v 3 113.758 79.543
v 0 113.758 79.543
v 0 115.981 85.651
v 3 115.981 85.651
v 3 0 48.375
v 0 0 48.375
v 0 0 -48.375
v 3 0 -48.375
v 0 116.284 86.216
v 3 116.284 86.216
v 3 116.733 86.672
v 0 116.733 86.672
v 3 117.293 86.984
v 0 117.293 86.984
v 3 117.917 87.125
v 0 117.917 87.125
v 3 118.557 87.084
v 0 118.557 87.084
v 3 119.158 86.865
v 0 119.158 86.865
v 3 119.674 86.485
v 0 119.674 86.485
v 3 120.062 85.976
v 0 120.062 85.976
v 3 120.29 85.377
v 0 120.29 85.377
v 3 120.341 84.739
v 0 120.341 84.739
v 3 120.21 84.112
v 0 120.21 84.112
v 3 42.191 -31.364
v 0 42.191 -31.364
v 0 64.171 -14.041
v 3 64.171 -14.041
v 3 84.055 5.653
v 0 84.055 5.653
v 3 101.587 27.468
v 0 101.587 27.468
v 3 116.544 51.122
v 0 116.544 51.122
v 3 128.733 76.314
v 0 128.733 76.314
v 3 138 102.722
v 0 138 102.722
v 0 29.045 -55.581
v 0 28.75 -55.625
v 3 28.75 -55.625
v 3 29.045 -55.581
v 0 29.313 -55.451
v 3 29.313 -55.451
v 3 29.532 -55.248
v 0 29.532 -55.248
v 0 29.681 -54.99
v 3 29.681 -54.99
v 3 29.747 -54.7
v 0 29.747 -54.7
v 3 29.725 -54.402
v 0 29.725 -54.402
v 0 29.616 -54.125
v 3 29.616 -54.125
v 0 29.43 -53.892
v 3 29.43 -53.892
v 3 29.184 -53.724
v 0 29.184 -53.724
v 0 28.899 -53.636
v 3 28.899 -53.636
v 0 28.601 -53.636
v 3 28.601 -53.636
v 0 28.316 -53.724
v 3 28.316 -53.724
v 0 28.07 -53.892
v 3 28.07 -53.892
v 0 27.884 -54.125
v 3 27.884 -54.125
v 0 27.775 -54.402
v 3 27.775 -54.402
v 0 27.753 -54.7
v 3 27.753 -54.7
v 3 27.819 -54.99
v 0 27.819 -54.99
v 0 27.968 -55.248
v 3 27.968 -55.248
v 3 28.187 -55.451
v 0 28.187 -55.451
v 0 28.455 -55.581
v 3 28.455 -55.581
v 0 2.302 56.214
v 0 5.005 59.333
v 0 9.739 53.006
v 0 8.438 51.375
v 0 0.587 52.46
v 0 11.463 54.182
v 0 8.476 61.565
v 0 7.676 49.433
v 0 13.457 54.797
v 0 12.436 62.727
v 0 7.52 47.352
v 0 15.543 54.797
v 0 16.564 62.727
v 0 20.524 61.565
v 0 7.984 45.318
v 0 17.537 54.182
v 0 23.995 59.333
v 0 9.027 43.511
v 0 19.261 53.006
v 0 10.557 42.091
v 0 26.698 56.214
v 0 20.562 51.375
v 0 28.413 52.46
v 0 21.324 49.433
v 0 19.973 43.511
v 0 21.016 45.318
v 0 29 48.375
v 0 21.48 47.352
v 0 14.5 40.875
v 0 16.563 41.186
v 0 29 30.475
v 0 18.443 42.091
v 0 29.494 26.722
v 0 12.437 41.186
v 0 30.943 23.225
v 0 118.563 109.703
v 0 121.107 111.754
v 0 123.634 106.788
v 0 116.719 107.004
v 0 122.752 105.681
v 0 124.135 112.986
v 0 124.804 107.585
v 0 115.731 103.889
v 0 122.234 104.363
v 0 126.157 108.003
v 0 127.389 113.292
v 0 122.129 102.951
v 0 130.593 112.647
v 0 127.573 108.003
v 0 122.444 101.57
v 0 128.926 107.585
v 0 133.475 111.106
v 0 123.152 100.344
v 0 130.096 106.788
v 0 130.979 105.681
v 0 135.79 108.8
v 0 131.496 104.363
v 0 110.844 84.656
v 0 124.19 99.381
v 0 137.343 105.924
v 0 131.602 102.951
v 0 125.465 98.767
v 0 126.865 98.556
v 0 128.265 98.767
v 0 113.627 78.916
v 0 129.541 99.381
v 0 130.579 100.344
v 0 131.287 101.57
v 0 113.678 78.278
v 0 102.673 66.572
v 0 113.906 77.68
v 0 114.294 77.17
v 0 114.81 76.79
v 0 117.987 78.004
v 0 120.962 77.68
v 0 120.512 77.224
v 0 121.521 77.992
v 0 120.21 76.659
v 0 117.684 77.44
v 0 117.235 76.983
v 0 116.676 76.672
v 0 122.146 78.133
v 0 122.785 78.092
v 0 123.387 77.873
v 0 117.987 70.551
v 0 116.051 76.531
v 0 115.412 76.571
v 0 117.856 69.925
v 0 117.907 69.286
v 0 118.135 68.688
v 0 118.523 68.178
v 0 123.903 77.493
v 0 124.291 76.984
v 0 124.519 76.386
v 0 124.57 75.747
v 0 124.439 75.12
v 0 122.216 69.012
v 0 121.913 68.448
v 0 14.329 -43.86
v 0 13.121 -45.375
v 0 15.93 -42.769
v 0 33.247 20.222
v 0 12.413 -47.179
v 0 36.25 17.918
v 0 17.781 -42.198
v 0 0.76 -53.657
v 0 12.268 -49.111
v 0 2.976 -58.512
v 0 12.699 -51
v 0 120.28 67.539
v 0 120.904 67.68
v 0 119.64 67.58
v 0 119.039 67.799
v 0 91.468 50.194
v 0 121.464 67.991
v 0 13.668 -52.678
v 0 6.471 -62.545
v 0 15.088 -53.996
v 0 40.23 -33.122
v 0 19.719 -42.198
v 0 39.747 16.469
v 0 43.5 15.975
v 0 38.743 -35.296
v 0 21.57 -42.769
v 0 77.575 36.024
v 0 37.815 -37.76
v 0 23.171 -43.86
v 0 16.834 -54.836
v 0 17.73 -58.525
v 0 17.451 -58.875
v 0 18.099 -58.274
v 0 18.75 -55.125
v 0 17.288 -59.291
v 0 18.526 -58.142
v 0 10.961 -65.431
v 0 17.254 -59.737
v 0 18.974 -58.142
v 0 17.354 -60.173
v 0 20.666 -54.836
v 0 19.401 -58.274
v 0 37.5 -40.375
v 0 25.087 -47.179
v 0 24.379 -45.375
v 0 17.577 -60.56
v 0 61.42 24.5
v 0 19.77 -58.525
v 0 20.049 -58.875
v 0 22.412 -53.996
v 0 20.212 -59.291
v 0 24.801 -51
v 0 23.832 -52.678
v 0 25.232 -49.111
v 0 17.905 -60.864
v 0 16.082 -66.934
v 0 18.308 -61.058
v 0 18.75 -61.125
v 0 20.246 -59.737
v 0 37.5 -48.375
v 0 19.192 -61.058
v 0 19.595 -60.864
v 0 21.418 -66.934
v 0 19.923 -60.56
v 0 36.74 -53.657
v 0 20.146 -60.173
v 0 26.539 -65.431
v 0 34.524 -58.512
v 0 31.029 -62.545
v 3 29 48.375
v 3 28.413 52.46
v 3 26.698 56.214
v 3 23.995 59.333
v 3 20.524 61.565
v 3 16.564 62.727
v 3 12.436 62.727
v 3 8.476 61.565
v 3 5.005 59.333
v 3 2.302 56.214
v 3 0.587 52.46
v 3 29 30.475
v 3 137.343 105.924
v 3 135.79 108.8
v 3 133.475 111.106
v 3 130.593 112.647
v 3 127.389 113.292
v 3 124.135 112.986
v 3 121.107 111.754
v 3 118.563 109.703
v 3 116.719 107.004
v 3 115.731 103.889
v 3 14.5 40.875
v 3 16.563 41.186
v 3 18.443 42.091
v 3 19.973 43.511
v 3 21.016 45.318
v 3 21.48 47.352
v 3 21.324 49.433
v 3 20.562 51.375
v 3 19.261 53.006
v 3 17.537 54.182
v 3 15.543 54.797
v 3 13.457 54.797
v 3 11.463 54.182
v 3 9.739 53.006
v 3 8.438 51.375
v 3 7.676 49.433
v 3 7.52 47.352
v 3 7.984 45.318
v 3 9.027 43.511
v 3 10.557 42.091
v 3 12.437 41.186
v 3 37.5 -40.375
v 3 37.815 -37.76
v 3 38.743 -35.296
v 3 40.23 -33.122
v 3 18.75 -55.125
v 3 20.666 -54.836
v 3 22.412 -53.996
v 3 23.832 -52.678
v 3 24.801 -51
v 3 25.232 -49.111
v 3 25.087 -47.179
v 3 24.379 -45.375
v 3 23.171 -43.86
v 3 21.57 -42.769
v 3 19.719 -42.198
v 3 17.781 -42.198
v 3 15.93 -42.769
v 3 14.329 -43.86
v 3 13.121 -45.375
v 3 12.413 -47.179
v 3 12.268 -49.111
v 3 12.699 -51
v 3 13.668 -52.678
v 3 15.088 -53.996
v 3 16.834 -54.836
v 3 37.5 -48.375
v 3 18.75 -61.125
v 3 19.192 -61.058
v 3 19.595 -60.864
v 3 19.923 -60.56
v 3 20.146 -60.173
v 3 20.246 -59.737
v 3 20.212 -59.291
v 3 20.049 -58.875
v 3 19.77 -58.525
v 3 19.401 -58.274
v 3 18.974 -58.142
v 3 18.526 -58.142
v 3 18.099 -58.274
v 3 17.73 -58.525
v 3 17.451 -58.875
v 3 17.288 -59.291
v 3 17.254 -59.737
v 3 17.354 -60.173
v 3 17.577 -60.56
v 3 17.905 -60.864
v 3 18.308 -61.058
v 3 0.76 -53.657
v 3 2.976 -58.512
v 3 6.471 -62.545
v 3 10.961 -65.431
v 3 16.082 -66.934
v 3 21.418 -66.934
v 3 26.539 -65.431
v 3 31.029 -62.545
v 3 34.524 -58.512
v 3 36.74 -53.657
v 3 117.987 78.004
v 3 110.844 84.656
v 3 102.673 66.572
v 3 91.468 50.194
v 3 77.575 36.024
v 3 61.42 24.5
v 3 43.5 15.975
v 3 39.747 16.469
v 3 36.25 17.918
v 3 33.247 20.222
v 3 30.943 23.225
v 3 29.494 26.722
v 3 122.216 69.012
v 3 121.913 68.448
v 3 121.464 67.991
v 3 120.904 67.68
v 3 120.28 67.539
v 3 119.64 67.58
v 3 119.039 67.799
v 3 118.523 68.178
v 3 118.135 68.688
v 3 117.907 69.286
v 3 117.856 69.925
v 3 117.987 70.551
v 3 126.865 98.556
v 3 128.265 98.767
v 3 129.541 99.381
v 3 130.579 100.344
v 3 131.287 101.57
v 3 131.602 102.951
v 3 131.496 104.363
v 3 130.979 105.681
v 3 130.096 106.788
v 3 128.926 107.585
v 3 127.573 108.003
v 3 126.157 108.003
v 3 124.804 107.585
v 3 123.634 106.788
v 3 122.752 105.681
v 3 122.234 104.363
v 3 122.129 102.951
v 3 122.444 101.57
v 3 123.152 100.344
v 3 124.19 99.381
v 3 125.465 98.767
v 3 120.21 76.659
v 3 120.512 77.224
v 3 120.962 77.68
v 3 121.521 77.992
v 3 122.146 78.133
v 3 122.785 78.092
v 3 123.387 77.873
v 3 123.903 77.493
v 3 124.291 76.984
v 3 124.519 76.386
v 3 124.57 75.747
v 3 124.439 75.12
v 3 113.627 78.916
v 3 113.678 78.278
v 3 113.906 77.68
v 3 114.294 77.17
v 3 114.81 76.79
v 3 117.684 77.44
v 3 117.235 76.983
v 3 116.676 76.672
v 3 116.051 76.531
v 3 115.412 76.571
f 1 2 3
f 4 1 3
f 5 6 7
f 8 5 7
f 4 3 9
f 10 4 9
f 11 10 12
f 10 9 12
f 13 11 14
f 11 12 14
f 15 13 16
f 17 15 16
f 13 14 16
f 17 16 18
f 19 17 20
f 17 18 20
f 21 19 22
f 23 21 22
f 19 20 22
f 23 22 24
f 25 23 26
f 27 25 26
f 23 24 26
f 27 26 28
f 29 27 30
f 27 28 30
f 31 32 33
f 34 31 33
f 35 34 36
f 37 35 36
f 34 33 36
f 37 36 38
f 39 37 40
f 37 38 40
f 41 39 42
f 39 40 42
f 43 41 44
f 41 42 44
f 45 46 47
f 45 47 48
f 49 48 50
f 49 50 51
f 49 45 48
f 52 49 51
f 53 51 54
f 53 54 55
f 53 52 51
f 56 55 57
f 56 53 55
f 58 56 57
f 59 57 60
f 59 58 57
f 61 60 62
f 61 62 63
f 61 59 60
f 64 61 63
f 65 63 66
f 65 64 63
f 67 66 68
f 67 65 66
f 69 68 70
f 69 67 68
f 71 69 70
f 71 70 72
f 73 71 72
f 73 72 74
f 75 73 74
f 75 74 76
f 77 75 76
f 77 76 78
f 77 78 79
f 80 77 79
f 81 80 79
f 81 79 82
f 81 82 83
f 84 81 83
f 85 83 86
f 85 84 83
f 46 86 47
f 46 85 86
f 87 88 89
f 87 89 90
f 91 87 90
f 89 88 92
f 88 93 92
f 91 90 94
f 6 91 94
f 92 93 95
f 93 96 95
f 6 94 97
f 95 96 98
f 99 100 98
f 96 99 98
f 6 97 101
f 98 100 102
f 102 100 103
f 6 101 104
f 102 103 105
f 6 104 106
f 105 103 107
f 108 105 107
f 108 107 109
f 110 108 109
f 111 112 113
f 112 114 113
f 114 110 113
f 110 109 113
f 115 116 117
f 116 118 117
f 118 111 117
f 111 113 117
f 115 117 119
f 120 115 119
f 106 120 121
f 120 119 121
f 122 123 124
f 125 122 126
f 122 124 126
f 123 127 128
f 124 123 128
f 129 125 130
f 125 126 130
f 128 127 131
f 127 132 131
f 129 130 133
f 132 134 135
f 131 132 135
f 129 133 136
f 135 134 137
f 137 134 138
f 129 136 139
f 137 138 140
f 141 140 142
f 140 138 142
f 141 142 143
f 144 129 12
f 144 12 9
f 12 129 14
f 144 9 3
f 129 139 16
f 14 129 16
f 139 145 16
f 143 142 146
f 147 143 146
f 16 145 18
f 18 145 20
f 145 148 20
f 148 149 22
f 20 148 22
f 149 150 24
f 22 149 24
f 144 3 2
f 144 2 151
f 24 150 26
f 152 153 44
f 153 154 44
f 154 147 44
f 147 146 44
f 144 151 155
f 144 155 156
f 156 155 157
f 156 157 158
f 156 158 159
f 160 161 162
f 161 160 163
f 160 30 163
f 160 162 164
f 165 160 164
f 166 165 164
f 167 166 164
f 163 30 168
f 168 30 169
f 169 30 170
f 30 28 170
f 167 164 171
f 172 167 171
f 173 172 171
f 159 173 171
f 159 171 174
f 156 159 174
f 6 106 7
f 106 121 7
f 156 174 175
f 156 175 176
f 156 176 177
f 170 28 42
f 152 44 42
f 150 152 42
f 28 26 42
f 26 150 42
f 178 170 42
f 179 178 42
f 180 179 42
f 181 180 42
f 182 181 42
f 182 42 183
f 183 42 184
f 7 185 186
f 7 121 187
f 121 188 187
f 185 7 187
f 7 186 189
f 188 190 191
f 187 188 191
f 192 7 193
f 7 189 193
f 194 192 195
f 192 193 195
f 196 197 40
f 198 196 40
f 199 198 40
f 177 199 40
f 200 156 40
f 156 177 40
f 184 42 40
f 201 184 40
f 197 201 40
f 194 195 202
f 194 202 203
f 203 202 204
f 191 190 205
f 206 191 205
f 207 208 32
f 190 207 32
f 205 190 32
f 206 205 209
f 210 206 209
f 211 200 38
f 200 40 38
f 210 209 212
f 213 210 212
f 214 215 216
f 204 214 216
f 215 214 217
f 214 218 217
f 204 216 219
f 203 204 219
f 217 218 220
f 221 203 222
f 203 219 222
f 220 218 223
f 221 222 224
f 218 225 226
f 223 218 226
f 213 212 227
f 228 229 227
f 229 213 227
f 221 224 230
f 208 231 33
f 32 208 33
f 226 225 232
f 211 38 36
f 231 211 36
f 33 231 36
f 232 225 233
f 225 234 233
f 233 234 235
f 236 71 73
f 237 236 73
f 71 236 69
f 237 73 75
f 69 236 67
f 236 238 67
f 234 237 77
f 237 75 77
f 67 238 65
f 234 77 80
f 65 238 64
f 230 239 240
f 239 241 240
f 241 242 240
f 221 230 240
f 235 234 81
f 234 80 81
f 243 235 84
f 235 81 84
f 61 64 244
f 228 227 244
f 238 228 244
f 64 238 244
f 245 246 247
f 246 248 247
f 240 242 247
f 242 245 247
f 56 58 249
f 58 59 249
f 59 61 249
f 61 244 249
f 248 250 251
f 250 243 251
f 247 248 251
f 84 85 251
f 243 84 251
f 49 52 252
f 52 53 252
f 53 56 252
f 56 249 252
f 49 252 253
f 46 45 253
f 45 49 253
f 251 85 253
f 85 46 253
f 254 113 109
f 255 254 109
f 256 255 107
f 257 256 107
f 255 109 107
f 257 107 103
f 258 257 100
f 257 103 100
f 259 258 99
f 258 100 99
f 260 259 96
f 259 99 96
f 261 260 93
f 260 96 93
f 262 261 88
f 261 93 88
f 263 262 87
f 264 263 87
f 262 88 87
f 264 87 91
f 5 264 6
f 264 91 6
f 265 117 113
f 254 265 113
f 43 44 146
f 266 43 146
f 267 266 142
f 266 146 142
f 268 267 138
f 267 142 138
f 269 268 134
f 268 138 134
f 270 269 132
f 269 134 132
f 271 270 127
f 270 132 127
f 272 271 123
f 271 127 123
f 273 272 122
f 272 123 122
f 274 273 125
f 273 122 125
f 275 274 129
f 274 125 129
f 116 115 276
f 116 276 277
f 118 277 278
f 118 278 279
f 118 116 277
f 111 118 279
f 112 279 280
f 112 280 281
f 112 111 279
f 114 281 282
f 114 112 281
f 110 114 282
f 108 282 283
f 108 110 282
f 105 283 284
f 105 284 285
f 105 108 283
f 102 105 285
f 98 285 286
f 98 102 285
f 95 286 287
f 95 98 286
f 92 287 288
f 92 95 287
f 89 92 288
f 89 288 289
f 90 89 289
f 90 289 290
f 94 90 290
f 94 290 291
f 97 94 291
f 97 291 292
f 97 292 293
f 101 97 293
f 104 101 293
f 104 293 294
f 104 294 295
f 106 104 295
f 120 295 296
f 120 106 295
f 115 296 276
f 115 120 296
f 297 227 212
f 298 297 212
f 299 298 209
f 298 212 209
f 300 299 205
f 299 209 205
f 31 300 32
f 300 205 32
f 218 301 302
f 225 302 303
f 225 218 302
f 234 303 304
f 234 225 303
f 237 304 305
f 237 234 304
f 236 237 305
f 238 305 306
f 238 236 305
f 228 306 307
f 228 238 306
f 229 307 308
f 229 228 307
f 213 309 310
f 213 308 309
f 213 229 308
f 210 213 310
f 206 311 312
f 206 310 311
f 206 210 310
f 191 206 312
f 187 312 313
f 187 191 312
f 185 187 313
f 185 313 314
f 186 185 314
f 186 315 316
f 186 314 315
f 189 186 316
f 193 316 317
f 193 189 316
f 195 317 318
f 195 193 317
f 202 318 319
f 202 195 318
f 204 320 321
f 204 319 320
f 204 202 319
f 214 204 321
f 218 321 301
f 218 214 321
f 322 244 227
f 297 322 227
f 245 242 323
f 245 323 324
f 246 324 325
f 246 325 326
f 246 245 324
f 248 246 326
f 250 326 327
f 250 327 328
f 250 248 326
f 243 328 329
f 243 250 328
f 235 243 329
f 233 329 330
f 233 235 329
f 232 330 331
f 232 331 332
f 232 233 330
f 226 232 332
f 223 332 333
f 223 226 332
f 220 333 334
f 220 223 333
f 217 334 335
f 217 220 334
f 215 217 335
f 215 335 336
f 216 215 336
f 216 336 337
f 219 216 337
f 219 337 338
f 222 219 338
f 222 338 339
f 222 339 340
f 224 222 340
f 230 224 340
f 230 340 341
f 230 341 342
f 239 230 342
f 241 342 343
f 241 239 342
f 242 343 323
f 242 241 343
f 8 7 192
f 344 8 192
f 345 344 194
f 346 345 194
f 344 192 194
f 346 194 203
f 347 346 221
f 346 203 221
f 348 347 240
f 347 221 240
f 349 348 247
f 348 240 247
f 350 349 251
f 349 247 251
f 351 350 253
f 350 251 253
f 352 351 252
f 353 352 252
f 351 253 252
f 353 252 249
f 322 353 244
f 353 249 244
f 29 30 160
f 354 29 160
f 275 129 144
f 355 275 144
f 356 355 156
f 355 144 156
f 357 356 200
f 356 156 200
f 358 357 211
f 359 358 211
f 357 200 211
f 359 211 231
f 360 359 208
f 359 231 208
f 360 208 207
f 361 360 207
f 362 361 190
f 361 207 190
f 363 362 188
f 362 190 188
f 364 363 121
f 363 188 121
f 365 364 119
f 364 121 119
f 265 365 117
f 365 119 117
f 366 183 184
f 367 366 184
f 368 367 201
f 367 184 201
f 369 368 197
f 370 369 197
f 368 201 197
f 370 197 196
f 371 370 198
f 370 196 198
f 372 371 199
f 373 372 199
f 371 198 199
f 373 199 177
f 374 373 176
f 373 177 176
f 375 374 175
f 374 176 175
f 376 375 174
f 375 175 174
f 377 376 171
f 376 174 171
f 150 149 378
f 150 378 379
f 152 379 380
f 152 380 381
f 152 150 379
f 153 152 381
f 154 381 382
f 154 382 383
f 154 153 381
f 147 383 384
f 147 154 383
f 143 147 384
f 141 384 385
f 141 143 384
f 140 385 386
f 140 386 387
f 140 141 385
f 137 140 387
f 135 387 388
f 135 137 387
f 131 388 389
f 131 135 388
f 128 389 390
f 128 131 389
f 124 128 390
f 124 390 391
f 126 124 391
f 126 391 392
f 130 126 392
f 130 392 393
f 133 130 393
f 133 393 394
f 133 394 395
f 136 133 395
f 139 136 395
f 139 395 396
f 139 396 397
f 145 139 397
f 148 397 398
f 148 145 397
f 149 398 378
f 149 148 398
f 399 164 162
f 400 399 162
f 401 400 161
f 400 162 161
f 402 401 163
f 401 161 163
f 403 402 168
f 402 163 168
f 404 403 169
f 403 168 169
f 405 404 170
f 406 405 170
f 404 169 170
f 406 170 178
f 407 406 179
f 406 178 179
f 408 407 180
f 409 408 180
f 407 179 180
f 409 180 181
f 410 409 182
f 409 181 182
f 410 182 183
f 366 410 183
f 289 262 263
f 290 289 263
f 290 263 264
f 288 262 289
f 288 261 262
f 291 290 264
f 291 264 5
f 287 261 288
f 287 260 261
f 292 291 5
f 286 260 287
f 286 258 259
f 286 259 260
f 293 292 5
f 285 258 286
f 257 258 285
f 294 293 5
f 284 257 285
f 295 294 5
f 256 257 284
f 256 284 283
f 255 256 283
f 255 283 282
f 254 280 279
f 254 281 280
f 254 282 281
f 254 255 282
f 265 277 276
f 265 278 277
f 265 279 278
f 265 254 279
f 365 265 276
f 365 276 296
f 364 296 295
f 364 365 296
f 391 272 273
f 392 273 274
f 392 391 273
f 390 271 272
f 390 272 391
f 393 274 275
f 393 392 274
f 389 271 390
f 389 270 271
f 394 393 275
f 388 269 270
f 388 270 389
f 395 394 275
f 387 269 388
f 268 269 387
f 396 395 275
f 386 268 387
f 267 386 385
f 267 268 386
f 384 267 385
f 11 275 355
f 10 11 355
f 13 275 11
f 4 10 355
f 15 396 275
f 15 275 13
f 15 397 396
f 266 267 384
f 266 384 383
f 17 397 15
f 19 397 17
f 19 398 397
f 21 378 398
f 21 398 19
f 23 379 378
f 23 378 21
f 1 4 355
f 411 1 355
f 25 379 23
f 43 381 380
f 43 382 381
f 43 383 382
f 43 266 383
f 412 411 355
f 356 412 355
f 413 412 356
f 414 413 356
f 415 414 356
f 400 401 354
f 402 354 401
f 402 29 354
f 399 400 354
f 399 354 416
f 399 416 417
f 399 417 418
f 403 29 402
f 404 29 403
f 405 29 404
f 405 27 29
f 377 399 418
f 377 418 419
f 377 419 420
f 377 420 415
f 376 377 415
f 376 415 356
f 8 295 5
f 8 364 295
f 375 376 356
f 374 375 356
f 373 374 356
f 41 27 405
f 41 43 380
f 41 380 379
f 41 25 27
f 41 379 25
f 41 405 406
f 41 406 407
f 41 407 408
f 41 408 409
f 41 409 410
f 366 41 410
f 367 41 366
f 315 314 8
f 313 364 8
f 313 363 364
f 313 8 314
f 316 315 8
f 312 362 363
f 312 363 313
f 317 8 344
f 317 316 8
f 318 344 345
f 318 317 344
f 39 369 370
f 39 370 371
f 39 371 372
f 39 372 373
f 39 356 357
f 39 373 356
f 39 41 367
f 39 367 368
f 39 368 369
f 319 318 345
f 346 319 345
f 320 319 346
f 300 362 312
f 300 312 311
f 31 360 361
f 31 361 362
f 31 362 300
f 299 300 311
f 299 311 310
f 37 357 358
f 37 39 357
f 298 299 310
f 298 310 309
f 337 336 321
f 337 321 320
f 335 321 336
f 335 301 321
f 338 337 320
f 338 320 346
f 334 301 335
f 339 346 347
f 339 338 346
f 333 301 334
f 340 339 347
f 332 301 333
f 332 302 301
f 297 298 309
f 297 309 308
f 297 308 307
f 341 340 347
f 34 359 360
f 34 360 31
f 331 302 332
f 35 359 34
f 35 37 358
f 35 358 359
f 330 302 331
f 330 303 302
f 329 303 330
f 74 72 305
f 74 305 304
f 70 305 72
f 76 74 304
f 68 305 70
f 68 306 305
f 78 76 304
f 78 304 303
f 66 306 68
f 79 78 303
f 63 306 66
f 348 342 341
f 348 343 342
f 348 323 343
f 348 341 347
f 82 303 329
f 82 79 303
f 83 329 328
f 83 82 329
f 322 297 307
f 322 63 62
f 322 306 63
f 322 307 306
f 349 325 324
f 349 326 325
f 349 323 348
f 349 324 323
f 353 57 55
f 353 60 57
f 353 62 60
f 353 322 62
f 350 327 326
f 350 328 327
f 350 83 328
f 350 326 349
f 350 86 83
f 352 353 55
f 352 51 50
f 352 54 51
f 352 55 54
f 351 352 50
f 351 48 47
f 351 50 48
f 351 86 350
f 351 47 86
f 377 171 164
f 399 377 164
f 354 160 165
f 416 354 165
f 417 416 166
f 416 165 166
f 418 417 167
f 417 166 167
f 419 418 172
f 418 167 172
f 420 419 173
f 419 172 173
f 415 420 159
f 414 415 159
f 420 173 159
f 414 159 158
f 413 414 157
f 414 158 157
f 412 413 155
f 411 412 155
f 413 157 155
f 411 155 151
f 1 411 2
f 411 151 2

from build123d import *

# Parameters (mm, degrees)
SKETCH1_R               = 1.5
SKETCH1_R_2             = 1
SKETCH1_R_3             = 7
SKETCH1_R_4             = 4.75
BOSS_EXTRUDE1_DEPTH     = 3
CUT_EXTRUDE1_DEPTH      = 179.582042719
CUT_EXTRUDE1_DEPTH_BACK = 179.582042719
SKETCH2_R               = 6.5


with BuildPart() as part:
    # Sketch1 → Boss-Extrude1 (new body)
    with BuildSketch(Plane(origin=(0, 0, 0), x_dir=(0, 0, -1), z_dir=(1, 0, 0))):
        with BuildLine():
            Line((-48.375, 0), (48.375, 0))
            ThreePointArc((48.375, 0), (67.125, 18.75), (48.375, 37.5))
            Line((48.375, 37.5), (40.375, 37.5))
            ThreePointArc((40.375, 37.5), (35.295765254, 38.742880835), (31.364327513, 42.1906592))
            ThreePointArc((31.364327513, 42.1906592), (-27.467628368, 101.587088748), (-102.722095146, 138))
            ThreePointArc((-102.722095146, 138), (-113.291936406, 127.38864025), (-103.88918697, 115.730561375))
            ThreePointArc((-103.88918697, 115.730561375), (-50.193524878, 91.468412174), (-15.975, 43.5))
            ThreePointArc((-15.975, 43.5), (-20.221951673, 33.246951673), (-30.475, 29))
            Line((-30.475, 29), (-48.375, 29))
            ThreePointArc((-48.375, 29), (-62.875, 14.5), (-48.375, 0))
        make_face()
        with Locations((59.625, 18.75)):
            Circle(SKETCH1_R, mode=Mode.SUBTRACT)
        with Locations((54.625, 28.75)):
            Circle(SKETCH1_R_2, mode=Mode.SUBTRACT)
        with Locations((-47.875, 14.5)):
            Circle(SKETCH1_R_3, mode=Mode.SUBTRACT)
        with Locations((-103.305641058, 126.865280687)):
            Circle(SKETCH1_R_4, mode=Mode.SUBTRACT)
        with BuildLine():
            Line((46.625, 23.25), (48.625, 23.25))
            ThreePointArc((48.625, 23.25), (53.125, 18.75), (48.625, 14.25))
            Line((48.625, 14.25), (46.625, 14.25))
            ThreePointArc((46.625, 14.25), (42.125, 18.75), (46.625, 23.25))
        make_face(mode=Mode.SUBTRACT)
        with BuildLine():
            Line((-84.112179989, 120.210043762), (-78.004177954, 117.98691283))
            ThreePointArc((-78.004177954, 117.98691283), (-76.659414879, 115.103059111), (-79.543268599, 113.758296037))
            Line((-79.543268599, 113.758296037), (-85.651270634, 115.981426968))
            ThreePointArc((-85.651270634, 115.981426968), (-86.996033708, 118.865280687), (-84.112179989, 120.210043762))
        make_face(mode=Mode.SUBTRACT)
        with BuildLine():
            Line((-75.120324234, 124.438660555), (-69.012322199, 122.215529624))
            ThreePointArc((-69.012322199, 122.215529624), (-67.667559125, 119.331675904), (-70.551412844, 117.98691283))
            Line((-70.551412844, 117.98691283), (-76.659414879, 120.210043762))
            ThreePointArc((-76.659414879, 120.210043762), (-78.004177954, 123.093897481), (-75.120324234, 124.438660555))
        make_face(mode=Mode.SUBTRACT)
    extrude(amount=BOSS_EXTRUDE1_DEPTH)

    # Sketch2 → Cut-Extrude1 (cut, two sides: drawn at the far end of the back side and taken through both)
    with BuildSketch(Plane(origin=(3, 0, 0), x_dir=(0, 0, -1), z_dir=(1, 0, 0)).offset(-CUT_EXTRUDE1_DEPTH_BACK)):
        with Locations((48.625, 18.75)):
            Circle(SKETCH2_R)
    extrude(amount=CUT_EXTRUDE1_DEPTH + CUT_EXTRUDE1_DEPTH_BACK, mode=Mode.SUBTRACT)


solid = part.part
